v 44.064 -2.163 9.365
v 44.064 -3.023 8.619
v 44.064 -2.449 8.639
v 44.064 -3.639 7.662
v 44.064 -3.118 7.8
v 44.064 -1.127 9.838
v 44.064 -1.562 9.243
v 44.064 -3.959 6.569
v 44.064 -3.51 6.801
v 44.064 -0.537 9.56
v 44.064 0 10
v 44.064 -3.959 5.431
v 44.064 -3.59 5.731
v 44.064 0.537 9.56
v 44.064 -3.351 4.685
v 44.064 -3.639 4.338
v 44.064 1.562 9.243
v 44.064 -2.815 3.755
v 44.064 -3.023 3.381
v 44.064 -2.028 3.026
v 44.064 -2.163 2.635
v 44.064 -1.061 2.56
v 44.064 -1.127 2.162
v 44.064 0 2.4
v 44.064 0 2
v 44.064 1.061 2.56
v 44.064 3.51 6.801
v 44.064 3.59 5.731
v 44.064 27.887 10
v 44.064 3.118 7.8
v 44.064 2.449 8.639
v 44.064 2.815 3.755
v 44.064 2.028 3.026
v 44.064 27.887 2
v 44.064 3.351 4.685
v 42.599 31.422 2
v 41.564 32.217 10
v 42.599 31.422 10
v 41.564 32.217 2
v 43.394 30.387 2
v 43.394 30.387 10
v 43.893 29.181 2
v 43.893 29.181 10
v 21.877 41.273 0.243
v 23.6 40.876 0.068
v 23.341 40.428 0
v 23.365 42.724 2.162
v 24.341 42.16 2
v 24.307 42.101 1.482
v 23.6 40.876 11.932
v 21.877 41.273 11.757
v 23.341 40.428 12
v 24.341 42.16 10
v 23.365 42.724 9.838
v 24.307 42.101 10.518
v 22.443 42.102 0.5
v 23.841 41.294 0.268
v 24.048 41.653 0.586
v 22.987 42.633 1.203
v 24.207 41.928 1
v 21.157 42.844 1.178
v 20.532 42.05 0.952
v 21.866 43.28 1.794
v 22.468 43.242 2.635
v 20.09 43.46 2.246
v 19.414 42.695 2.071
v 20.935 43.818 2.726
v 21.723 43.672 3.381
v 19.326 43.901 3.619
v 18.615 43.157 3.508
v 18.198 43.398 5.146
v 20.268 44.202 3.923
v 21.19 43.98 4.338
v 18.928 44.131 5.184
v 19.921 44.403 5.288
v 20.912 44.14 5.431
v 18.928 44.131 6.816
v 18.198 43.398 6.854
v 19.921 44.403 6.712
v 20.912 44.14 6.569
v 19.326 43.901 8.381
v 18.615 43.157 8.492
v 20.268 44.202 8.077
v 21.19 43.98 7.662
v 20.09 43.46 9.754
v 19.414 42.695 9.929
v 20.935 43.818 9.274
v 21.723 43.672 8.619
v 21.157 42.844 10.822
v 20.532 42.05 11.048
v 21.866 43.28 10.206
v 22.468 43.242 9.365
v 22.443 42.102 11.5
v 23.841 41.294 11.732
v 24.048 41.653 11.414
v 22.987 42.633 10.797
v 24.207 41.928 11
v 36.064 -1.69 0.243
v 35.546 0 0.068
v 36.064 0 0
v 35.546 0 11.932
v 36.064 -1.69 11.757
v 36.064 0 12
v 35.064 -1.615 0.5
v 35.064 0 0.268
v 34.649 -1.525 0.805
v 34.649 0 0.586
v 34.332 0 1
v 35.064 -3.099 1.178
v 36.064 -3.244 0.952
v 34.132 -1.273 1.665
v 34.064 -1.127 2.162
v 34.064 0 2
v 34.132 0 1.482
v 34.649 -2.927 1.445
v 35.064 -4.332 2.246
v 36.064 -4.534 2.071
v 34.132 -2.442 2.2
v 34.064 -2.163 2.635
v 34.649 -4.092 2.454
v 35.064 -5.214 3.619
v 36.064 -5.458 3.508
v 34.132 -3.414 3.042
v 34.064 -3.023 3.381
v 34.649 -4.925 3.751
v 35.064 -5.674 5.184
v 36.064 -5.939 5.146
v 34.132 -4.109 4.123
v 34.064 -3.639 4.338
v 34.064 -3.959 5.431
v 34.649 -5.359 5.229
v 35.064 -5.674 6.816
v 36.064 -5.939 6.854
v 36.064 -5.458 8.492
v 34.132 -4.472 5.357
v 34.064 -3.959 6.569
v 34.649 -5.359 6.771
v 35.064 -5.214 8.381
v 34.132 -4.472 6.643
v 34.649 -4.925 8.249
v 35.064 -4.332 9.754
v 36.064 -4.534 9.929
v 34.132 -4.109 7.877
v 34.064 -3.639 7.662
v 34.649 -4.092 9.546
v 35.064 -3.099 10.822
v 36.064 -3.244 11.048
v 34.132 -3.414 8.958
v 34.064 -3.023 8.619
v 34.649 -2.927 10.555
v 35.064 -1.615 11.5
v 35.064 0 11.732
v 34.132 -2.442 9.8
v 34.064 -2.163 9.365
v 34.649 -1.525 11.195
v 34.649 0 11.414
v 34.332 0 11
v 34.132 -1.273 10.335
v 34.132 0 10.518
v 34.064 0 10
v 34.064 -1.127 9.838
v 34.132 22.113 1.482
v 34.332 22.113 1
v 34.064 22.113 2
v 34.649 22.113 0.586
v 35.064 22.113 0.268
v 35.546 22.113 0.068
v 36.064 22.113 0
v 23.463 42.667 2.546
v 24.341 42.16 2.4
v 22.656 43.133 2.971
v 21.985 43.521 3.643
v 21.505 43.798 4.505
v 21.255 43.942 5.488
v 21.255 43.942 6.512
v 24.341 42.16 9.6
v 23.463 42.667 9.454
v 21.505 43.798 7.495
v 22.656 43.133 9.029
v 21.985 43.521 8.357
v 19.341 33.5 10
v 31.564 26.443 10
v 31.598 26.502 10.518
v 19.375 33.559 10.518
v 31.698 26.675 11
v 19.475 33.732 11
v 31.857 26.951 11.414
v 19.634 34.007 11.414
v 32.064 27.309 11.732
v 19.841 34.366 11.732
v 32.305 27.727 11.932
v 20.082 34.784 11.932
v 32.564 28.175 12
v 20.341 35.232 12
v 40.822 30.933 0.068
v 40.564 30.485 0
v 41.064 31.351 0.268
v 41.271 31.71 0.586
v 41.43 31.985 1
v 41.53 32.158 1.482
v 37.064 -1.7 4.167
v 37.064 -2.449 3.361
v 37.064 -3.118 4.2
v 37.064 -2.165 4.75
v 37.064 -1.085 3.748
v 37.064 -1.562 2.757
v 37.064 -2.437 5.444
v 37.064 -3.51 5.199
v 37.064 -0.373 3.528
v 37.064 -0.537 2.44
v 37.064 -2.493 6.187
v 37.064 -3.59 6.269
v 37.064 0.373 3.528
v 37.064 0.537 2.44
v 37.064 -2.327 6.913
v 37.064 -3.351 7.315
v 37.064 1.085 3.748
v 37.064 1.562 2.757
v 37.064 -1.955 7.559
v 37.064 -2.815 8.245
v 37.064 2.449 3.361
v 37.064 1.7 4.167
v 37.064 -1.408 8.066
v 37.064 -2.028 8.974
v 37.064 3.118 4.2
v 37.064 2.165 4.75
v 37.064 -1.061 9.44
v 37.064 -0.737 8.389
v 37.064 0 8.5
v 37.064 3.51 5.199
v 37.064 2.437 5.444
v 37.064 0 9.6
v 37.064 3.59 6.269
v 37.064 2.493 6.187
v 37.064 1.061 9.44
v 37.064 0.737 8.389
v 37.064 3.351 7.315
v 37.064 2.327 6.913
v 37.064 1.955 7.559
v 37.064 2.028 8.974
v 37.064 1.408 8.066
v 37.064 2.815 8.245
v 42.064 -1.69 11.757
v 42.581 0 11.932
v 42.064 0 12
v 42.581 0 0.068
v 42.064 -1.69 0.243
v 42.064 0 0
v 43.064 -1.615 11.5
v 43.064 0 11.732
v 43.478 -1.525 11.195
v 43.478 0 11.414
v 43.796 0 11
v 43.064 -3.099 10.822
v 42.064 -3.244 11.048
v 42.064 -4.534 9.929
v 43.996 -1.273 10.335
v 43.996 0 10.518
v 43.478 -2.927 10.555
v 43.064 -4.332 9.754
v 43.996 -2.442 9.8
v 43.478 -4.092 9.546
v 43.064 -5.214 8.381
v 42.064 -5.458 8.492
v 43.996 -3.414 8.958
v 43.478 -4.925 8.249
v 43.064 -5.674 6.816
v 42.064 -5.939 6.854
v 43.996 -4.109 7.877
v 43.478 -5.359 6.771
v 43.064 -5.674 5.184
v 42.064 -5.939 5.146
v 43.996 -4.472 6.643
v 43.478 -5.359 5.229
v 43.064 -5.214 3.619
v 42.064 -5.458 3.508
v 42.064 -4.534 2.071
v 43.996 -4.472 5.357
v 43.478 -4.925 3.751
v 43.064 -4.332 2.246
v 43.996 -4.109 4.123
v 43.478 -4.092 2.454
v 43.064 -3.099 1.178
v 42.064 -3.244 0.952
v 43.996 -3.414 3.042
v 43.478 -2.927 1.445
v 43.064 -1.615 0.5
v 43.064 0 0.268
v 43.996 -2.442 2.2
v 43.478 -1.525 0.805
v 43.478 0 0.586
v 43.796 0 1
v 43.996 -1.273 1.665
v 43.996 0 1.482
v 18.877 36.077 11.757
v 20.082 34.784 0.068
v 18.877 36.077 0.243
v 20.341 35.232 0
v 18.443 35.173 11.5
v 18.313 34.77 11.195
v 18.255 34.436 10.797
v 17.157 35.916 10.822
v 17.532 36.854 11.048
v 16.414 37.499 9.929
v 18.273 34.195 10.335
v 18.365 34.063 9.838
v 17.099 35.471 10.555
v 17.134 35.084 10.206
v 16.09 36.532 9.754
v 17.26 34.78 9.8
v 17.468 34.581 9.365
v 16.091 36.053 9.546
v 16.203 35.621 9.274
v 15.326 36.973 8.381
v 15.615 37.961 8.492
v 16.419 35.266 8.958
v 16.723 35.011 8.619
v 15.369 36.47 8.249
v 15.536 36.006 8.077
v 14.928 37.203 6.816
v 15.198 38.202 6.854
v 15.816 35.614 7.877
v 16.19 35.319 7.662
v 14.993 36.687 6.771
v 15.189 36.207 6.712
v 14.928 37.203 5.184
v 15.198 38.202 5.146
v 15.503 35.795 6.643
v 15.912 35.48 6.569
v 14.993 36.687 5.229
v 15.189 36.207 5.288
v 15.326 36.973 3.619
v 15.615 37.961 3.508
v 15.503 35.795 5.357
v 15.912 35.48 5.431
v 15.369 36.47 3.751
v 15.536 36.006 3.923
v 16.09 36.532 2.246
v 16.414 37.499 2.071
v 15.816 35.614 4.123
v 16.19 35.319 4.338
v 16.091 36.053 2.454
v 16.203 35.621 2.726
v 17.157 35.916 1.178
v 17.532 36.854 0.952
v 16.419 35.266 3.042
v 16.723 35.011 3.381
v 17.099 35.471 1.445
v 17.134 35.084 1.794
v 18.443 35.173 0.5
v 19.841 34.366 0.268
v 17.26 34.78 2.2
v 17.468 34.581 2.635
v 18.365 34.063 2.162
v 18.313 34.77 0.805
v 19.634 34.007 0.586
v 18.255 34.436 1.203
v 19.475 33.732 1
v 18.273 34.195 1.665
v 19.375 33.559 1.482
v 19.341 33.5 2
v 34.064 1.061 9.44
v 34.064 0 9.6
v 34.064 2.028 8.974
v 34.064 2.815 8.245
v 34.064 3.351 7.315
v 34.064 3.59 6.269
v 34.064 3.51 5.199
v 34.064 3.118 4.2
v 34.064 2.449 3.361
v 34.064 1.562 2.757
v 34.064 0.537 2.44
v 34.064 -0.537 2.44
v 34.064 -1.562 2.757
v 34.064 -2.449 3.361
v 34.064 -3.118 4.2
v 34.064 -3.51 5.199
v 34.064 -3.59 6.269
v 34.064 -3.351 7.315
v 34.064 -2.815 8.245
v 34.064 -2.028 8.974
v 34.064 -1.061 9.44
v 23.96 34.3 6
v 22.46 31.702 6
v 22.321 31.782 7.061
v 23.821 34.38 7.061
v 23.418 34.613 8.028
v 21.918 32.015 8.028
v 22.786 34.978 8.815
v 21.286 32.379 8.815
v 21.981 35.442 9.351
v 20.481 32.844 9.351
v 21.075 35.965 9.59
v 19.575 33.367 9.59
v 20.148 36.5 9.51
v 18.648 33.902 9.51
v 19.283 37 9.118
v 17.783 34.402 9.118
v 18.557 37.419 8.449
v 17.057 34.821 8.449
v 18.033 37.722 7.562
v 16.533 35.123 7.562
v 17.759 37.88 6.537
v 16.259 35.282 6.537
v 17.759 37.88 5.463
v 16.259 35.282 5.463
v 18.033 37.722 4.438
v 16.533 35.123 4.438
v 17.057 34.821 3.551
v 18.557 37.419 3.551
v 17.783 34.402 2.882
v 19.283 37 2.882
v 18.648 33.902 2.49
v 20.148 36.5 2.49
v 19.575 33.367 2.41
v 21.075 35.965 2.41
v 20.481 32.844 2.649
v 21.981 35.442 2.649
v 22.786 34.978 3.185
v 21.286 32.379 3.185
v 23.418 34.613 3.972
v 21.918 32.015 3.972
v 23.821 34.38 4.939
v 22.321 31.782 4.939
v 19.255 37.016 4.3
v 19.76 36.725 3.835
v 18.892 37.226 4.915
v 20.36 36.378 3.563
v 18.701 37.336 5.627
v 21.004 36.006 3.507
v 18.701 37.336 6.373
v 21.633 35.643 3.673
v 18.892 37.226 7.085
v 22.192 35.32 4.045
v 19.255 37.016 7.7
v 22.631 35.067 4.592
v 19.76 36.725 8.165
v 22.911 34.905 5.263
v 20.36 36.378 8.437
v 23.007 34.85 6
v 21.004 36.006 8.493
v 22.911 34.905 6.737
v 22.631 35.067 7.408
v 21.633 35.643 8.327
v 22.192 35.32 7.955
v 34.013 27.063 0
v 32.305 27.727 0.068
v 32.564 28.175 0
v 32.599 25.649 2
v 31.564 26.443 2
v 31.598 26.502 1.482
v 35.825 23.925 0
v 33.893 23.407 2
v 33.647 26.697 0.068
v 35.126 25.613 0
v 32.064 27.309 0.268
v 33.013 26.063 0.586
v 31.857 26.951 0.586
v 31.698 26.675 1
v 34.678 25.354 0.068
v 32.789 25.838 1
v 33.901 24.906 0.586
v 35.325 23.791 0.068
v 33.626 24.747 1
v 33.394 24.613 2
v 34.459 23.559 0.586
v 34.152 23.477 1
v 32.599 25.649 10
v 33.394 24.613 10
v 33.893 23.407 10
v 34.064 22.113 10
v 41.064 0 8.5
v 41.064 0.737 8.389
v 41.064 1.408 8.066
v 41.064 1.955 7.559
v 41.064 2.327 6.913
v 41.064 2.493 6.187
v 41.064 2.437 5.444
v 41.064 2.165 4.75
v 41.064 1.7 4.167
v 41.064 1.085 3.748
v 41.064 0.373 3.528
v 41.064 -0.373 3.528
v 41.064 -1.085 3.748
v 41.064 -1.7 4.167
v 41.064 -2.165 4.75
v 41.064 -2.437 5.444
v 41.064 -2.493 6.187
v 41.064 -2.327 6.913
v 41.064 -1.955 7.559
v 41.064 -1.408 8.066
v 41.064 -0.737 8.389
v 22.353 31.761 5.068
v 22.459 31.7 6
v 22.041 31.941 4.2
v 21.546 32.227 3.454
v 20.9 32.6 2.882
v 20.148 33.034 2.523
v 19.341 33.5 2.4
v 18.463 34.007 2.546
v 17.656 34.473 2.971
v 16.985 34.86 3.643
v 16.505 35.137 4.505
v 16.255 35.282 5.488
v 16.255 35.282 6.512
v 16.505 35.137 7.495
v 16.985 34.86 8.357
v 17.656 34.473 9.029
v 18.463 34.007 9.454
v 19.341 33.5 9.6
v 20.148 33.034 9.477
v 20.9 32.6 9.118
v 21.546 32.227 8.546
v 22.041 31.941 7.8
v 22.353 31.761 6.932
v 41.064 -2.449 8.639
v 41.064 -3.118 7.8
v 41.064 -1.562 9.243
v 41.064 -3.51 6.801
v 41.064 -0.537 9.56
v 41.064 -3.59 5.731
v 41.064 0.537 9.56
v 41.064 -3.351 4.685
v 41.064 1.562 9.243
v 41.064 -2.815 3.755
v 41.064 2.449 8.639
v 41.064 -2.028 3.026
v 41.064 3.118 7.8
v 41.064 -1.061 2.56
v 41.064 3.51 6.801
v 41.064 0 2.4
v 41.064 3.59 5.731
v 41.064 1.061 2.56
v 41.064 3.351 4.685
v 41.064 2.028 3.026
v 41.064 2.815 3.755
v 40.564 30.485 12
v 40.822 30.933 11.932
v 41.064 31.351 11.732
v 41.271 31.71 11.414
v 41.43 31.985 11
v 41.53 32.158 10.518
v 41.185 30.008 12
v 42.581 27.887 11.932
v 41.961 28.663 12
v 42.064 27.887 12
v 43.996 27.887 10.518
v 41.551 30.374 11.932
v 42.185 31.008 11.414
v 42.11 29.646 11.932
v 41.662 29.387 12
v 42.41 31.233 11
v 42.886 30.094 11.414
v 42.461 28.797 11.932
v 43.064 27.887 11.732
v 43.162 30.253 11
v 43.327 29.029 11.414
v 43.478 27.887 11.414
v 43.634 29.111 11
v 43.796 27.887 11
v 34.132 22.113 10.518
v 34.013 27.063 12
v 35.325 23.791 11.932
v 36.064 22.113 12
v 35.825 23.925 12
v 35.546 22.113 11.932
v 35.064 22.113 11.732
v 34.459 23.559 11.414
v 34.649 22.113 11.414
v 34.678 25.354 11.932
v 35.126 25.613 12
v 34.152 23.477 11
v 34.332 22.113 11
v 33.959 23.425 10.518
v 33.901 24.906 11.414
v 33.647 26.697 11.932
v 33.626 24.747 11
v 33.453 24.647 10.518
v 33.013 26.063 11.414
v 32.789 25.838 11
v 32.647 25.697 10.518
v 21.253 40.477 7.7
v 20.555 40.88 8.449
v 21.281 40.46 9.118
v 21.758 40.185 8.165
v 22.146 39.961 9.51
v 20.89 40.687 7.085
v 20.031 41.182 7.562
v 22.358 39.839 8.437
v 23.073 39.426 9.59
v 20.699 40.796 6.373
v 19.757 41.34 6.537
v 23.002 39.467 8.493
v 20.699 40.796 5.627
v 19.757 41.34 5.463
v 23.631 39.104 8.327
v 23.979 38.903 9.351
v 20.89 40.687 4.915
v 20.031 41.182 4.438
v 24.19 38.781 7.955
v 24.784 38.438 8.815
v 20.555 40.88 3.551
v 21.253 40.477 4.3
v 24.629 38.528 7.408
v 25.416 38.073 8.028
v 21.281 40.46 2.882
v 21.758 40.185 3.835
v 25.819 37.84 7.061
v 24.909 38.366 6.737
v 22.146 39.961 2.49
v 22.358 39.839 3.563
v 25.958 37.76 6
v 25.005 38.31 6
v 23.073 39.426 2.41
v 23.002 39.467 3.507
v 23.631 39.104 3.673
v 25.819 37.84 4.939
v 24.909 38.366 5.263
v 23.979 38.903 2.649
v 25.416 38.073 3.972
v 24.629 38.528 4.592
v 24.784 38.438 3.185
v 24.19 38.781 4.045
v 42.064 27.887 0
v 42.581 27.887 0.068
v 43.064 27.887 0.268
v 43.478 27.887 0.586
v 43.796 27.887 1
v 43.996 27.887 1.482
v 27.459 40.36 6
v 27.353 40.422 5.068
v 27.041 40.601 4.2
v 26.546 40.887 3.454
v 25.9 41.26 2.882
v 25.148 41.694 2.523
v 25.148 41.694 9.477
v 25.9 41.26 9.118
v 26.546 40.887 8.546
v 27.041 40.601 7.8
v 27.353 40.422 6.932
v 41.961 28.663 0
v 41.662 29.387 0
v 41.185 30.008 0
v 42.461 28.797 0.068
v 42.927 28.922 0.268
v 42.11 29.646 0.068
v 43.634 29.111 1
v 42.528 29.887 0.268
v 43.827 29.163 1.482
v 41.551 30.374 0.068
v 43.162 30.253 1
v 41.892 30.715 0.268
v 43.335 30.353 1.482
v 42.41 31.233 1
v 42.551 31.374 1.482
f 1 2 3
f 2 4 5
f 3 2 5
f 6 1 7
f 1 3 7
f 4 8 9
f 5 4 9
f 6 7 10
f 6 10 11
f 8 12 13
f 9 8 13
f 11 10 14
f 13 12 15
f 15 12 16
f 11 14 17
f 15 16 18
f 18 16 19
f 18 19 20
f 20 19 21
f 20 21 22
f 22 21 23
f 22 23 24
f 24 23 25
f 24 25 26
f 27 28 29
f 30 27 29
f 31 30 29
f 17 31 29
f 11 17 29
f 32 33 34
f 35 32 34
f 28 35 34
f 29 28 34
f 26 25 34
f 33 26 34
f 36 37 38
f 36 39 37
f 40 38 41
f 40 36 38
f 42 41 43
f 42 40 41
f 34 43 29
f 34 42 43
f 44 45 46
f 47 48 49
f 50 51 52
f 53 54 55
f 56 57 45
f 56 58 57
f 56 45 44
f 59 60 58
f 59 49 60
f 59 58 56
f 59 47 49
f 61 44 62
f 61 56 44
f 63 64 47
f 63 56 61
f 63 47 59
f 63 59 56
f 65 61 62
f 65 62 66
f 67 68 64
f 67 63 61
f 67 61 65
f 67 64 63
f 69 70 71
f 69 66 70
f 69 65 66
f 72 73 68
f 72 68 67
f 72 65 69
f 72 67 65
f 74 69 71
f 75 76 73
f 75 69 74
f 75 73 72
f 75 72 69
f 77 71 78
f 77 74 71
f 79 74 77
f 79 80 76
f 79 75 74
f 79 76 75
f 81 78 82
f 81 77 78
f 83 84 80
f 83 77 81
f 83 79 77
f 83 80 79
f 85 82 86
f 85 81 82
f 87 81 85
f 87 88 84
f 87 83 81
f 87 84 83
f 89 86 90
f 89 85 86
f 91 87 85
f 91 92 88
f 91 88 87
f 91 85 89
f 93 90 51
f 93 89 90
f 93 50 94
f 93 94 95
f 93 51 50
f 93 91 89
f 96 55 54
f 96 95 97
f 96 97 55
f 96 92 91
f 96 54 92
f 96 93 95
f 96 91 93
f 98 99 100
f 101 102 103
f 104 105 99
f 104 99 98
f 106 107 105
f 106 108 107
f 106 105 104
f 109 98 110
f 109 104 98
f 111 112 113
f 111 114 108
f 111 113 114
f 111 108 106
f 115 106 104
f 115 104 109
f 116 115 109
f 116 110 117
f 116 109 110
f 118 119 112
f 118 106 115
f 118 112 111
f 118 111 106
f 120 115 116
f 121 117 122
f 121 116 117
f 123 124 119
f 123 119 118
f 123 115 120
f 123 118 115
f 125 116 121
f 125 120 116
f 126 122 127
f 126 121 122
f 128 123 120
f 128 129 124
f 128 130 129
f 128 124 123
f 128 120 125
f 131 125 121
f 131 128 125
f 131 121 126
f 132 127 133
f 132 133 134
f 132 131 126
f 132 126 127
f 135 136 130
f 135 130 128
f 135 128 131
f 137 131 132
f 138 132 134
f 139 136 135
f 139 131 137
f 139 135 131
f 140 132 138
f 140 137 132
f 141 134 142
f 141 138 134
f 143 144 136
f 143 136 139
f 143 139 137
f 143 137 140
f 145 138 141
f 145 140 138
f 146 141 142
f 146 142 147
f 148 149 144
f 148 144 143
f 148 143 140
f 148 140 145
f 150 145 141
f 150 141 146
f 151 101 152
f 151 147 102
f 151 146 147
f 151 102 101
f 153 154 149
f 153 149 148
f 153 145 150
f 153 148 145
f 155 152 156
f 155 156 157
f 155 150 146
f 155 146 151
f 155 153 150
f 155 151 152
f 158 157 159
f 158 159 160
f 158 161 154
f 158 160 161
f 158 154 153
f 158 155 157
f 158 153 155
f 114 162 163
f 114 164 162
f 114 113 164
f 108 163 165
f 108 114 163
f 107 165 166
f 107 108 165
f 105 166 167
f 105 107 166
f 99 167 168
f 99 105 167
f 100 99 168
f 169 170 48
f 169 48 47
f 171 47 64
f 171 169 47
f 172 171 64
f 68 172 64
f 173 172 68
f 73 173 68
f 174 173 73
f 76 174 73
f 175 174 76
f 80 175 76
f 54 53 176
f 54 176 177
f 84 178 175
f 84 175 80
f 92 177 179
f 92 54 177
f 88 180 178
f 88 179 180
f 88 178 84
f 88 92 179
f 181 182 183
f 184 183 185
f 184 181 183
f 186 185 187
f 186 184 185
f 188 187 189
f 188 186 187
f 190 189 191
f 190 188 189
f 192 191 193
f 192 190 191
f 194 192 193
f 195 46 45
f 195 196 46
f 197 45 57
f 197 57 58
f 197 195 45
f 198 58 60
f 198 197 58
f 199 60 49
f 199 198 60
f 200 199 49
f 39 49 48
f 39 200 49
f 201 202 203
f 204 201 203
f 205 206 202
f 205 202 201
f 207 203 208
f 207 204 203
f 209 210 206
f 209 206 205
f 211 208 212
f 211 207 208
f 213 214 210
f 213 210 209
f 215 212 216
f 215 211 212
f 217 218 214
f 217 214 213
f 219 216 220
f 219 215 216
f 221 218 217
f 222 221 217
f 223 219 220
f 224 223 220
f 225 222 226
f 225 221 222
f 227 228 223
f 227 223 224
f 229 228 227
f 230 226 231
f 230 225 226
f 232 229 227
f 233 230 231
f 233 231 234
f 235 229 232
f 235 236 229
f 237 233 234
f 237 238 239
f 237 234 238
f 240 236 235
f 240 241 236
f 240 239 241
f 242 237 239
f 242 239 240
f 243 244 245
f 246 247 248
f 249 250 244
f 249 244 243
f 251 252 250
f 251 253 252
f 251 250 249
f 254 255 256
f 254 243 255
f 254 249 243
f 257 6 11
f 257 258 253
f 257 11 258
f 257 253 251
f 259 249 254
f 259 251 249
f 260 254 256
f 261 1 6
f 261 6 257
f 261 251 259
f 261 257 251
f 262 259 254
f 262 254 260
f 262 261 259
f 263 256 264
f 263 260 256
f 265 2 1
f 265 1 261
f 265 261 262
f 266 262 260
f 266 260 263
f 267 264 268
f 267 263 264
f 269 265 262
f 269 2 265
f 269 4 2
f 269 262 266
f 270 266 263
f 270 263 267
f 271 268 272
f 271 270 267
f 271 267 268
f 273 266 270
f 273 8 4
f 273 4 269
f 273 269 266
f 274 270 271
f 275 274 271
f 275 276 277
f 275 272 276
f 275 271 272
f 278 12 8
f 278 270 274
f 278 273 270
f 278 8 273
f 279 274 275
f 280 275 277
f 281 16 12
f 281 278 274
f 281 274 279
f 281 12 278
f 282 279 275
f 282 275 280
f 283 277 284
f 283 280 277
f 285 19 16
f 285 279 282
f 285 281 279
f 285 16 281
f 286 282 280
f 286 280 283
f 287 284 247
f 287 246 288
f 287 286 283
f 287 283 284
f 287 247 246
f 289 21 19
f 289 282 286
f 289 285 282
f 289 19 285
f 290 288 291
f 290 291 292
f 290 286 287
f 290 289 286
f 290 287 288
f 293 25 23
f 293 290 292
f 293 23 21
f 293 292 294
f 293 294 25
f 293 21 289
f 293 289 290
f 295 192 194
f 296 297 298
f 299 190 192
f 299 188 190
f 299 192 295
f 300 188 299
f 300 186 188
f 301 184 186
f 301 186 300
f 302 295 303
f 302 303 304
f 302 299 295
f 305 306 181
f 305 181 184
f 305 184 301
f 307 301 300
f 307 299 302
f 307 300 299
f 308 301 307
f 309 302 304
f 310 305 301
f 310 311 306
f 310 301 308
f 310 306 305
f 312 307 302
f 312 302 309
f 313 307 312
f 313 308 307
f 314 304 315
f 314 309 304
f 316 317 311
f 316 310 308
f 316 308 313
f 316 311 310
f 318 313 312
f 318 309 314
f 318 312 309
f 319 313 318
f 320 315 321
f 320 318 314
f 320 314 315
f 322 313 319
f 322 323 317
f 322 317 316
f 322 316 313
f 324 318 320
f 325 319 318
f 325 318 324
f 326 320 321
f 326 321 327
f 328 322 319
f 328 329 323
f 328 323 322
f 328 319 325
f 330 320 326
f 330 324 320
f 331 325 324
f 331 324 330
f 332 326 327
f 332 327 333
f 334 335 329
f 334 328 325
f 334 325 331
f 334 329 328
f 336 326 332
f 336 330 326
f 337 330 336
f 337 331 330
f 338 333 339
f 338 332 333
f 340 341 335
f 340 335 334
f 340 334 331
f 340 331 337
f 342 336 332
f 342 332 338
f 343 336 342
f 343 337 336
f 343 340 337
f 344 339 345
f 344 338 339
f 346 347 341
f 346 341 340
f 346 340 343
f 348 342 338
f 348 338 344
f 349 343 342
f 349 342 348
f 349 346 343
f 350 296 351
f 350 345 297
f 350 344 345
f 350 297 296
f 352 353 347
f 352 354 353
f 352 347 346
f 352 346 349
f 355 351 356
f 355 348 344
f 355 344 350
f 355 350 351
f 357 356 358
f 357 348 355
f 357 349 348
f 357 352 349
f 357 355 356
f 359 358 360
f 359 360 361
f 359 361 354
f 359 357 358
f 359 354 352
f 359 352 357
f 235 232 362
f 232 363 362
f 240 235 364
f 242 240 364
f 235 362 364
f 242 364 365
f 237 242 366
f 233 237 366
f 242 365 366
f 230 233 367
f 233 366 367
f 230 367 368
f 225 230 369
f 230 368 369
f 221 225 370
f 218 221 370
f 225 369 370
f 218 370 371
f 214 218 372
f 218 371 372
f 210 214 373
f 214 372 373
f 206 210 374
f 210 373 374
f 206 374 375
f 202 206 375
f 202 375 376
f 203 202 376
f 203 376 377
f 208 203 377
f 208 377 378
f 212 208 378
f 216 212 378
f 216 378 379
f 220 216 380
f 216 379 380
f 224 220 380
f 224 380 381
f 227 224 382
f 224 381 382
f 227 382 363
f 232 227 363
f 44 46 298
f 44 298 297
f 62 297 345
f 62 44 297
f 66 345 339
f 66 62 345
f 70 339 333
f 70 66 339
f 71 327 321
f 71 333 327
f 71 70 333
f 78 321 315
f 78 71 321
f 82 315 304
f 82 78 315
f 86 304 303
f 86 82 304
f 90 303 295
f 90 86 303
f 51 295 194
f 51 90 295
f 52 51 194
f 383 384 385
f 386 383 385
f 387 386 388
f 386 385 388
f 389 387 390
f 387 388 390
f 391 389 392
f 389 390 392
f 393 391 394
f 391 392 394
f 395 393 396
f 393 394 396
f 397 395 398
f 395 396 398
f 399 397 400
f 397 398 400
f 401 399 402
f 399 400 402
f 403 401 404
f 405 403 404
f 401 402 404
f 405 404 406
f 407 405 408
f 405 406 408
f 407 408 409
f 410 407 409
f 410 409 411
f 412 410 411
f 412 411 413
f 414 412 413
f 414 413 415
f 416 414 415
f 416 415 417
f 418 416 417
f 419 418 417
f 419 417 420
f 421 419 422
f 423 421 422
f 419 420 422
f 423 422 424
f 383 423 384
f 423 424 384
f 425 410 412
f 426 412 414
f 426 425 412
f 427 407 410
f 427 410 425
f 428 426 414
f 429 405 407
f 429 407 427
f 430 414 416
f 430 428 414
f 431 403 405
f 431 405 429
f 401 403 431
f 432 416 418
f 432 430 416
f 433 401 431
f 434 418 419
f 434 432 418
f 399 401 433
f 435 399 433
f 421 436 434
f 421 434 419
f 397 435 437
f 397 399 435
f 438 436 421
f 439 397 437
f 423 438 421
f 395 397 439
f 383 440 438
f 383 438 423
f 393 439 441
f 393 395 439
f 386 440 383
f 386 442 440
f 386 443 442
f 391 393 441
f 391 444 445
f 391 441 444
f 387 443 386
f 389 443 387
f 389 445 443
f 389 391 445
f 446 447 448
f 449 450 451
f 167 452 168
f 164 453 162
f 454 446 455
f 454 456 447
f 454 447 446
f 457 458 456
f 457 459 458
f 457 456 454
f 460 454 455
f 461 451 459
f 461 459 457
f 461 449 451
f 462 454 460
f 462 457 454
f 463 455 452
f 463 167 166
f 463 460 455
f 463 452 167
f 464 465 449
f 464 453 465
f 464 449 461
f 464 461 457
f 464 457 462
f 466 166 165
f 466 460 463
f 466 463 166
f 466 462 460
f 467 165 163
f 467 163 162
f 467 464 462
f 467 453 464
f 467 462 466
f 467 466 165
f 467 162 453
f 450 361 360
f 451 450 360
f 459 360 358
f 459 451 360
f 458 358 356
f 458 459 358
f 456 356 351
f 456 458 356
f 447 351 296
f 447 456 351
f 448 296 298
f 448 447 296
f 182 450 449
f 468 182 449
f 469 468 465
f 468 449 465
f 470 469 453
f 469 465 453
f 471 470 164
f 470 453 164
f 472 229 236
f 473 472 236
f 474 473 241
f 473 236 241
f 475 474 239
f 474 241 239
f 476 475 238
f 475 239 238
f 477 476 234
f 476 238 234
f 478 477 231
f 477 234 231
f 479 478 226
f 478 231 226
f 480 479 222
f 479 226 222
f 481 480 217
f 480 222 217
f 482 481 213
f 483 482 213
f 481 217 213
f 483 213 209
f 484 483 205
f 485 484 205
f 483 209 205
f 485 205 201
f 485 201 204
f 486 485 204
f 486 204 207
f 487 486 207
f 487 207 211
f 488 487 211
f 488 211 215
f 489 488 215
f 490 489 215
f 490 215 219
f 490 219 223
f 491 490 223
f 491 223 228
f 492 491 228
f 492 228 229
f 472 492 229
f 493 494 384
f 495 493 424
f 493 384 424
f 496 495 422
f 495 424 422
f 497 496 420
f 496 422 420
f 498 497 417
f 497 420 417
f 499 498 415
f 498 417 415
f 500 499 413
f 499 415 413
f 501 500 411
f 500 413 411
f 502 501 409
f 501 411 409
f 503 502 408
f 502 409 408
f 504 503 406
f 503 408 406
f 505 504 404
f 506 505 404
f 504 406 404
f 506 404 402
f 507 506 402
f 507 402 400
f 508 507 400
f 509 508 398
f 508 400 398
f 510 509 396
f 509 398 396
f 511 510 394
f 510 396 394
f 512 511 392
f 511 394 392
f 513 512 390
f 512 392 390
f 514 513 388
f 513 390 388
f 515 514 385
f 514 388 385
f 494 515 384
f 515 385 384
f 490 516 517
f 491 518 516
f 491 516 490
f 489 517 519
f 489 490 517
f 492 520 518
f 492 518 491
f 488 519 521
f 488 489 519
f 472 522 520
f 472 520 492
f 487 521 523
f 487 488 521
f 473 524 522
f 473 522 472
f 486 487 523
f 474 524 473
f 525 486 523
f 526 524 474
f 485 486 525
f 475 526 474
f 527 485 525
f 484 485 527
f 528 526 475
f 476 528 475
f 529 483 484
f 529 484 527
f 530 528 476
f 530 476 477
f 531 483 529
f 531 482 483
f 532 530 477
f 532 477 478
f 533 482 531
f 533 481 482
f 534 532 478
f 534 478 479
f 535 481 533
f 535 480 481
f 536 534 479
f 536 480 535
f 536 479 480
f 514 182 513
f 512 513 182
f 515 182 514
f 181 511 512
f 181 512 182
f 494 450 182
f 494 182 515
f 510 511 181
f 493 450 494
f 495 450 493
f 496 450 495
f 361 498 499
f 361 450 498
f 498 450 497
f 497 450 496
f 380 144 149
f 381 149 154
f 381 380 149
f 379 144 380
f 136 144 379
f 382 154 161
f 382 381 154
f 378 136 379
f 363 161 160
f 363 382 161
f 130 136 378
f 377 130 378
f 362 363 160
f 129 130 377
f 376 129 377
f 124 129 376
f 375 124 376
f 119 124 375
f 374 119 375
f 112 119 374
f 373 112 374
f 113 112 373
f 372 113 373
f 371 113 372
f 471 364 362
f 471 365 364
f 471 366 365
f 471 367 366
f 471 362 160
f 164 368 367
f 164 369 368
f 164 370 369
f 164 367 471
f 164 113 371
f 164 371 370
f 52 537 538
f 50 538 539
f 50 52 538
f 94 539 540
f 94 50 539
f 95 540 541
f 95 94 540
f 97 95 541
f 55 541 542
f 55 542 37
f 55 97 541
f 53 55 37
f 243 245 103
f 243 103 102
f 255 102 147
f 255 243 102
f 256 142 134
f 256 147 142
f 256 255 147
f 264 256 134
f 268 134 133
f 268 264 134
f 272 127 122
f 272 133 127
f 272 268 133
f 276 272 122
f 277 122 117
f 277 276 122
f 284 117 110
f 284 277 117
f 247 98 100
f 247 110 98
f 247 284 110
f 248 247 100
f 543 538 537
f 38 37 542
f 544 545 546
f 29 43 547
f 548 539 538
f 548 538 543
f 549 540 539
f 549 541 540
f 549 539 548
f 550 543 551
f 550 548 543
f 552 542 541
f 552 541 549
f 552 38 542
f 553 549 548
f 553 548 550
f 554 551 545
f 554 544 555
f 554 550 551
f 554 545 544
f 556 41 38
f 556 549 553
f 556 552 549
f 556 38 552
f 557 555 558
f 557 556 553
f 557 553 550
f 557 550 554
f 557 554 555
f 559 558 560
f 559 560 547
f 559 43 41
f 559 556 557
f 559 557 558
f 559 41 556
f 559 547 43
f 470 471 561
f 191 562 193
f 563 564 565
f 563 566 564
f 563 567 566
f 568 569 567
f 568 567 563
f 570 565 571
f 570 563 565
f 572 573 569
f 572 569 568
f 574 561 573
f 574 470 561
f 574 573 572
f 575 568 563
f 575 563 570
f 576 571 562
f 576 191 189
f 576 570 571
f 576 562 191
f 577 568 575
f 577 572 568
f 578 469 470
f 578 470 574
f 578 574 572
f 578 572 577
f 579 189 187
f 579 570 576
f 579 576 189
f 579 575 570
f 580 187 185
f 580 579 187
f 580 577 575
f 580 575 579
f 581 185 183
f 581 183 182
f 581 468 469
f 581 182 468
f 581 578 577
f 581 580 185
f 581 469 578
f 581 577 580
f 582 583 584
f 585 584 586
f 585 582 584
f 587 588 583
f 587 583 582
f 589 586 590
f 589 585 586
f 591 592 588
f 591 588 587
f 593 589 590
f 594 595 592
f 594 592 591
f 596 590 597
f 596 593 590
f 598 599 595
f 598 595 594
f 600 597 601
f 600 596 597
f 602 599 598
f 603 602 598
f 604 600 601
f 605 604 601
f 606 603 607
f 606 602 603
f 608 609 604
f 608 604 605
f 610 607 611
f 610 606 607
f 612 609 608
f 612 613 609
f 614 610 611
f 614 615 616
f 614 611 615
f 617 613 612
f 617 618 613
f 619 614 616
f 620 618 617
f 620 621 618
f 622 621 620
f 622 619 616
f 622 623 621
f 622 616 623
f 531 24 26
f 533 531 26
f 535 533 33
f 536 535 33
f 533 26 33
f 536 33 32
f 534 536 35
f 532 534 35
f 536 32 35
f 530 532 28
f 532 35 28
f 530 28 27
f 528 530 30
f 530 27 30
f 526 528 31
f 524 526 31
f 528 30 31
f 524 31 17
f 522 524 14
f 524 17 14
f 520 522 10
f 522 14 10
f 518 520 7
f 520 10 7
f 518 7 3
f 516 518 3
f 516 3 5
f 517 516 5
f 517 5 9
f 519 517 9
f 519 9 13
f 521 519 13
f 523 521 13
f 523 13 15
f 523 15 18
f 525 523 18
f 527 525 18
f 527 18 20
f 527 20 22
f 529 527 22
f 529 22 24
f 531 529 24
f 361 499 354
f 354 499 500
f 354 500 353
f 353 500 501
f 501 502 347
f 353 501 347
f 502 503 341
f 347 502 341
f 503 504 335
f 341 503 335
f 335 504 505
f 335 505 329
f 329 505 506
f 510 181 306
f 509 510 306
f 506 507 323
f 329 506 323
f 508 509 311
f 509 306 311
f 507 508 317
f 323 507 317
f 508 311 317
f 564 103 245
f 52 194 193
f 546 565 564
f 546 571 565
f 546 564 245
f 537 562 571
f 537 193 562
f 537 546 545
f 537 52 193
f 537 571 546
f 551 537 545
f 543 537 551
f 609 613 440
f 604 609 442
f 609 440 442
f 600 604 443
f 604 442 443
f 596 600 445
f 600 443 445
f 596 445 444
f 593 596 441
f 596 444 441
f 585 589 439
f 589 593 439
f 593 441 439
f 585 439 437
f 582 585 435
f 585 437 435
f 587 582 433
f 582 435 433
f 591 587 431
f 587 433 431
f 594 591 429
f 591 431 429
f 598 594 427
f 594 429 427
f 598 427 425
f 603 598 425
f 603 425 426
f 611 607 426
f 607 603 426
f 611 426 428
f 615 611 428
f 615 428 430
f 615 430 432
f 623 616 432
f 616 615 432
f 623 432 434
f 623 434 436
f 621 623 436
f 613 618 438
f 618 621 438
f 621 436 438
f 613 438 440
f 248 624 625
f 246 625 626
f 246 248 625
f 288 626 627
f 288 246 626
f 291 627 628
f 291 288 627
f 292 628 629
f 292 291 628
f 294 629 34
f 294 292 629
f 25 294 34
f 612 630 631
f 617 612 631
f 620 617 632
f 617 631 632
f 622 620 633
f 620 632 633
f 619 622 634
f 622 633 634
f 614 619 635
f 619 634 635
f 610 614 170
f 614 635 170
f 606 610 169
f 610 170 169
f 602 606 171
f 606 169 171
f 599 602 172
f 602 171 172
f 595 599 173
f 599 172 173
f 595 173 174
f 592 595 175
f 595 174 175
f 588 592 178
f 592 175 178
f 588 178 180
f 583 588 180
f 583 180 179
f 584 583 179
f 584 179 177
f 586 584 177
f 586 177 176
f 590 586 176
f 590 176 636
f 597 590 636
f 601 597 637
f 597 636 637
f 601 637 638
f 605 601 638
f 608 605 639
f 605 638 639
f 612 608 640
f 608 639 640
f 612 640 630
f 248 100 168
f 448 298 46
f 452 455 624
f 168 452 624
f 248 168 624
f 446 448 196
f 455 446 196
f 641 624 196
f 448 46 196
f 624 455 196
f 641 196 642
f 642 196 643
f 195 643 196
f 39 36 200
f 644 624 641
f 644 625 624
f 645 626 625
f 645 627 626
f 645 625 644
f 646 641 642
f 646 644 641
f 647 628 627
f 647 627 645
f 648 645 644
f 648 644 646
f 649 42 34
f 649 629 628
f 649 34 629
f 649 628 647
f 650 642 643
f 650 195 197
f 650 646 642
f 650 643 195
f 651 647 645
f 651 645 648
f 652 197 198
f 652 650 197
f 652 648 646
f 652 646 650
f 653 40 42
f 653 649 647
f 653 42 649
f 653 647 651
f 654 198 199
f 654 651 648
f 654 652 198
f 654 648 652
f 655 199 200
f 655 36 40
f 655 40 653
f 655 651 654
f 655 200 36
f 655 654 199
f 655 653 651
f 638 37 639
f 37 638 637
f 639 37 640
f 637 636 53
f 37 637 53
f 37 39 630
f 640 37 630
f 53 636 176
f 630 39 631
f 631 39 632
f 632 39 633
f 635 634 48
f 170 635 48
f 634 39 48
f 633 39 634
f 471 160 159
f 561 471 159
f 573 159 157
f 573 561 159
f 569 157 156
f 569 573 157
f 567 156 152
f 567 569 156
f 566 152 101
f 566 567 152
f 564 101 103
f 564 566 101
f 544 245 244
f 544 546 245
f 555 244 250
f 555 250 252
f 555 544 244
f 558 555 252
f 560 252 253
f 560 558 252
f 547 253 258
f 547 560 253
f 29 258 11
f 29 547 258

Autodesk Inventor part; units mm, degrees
ref_plane "YZ Plane" through (0, 0, 0) normal (1, 0, 0) x (0, 1, 0)
sketch "Sketch1" plane through (0, 0, 0) normal (0, 0, 1) x (1, 0, 0)
  line L0 (44.063666, 0) -> (0, 0)
  line L1 (0, 0) -> (34.830781, 60.328682)
  line L2 (34.063666, 0) -> (34.063666, 22.113249)
  line L3 (31.563666, 26.443376) -> (19.341234, 33.5)
  line L4 (44.063666, 0) -> (44.063666, 27.886751)
  line L5 (41.563666, 32.216878) -> (24.341234, 42.160254)
  arc A0 (34.063666, 22.113249) -> (31.563666, 26.443376) centre (29.063666, 22.113249) ccw
  arc A1 (44.063666, 27.886751) -> (41.563666, 32.216878) centre (39.063666, 27.886751) ccw
  line L6 (24.341234, 42.160254) -> (19.341234, 33.5)
  line L7 (24.341234, 42.160254) -> (41.563666, 32.216878)
  line L8 (19.341234, 33.5) -> (31.563666, 26.443376)
  line L9 (34.063666, 0) -> (44.063666, 0)
  line L10 (44.063666, 0) -> (44.063666, 27.886751)
  line L11 (34.063666, 0) -> (44.063666, 0)
  line L12 (44.063666, 0) -> (44.063666, 27.886751)
  line L13 (41.563666, 32.216878) -> (24.341234, 42.160254)
  line L14 (24.341234, 42.160254) -> (19.341234, 33.5)
  line L15 (19.341234, 33.5) -> (31.563666, 26.443376)
  line L16 (34.063666, 22.113249) -> (34.063666, 0)
  point P0 (25, 43.30127)
  point P1 (34.063666, 25)
  dimension "d37" = 60
  dimension "d38" = 10
  dimension "d39" = 10
  dimension "d40" = 0
  dimension "d41" = 0
  dimension "d42" = 25
  dimension "d43" = 17
  dimension "d44" = 120
  dimension "d45" = 5
extrude "Extrusion1" add sketch "Sketch1" along normal blind 12 contours L0 L2 A0 L3 L1 L5 A1 L4
ref_plane "Work Plane1" through (41.563666, 32.216878, 0) normal (0.5, 0.8660254, 0) x (-0.8660254, 0.5, 0)
sketch "Sketch2" plane through (41.563666, 32.216878, 0) normal (0.5, 0.8660254, 0) x (-0.8660254, 0.5, 0)
  circle A0 centre (19.886751, 6) radius 6
  line L0 (19.886751, 0) -> (19.886751, 12)
  line L1 (0, 12) -> (19.886751, 12)
  dimension "d5" = 12
  dimension "d47" = 0
  dimension "d48" = 6
extrude "Extrusion2" add sketch "Sketch2" against normal blind 10
ref_plane "Work Plane2" through (44.063666, 27.886751, 0) normal (1, 0, 0) x (0, 1, 0)
sketch "Sketch3" plane through (44.063666, 27.886751, 0) normal (1, 0, 0) x (0, 1, 0)
  circle A0 centre (-27.886751, 6) radius 6
  line L0 (-27.886751, 0) -> (-27.886751, 12)
  line L1 (-27.886751, 0) -> (0, 0)
  point P0 (43.30127, 10)
  point P1 (5.613249, 12)
  dimension "d10" = 12
  dimension "d49" = 0
  dimension "d50" = 6
extrude "Extrusion3" add sketch "Sketch3" against normal blind 10
sketch "Sketch4" plane through (36.563666, 23.556624, 0) normal (-0.5, -0.8660254, 0) x (0.8660254, -0.5, 0)
  circle A0 centre (-19.886751, 6) radius 2.5
  circle A1 centre (-19.886751, 6) radius 6
  point P0 (-19.886751, 0)
  point P1 (-19.886751, 12)
  dimension "d15" = 5
extrude "Extrusion4" cut sketch "Sketch4" along normal through all both and the other way through all contours A0
sketch "Sketch5" plane through (34.063666, 27.886751, 0) normal (-1, 0, 0) x (0, 0, 1)
  circle A0 centre (6, -27.886751) radius 2.5
  arc A1 (0, -27.886751) -> (12, -27.886751) centre (6, -27.886751) ccw
  dimension "d18" = 5
extrude "Extrusion5" cut sketch "Sketch5" along normal through all both and the other way through all
sketch "Sketch6" plane through (41.563666, 32.216878, 0) normal (0.5, 0.8660254, 0) x (0.8660254, -0.5, 0)
  circle A0 centre (-19.886751, -6) radius 3.6
  circle A1 centre (-19.886751, -6) radius 2.5
  arc A2 (-19.886751, 0) -> (-19.886751, 0) centre (-19.886751, -6) ccw
  point P0 (0, -10)
  dimension "d21" = 5
  dimension "d22" = 7.2
extrude "Extrusion6" cut sketch "Sketch6" against normal blind 3 contours A0
sketch "Sketch7" plane through (36.563666, 23.556624, 0) normal (-0.5, -0.8660254, 0) x (0.8660254, -0.5, 0)
  circle A0 centre (-19.886751, 6) radius 3.6
  circle A1 centre (-19.886751, 6) radius 2.5
  arc A2 (-17.386751, 6) -> (-17.386751, 6) centre (-19.886751, 6) ccw
  point P0 (-19.886751, 0)
  dimension "d25" = 5
  dimension "d26" = 7.2
extrude "Extrusion7" cut sketch "Sketch7" along normal mid plane 6
sketch "Sketch8" plane through (34.063666, 27.886751, 0) normal (-1, 0, 0) x (0, 0, 1)
  circle A0 centre (6, -27.886751) radius 3.6
  circle A1 centre (6, -27.886751) radius 2.5
  arc A2 (8.5, -27.886751) -> (8.5, -27.886751) centre (6, -27.886751) ccw
  point P0 (0, -27.886751)
  dimension "d29" = 7.2
  dimension "d30" = 5
extrude "Extrusion8" cut sketch "Sketch8" along normal mid plane 6
sketch "Sketch9" plane through (44.063666, 27.886751, 0) normal (1, 0, 0) x (0, 0, -1)
  circle A0 centre (-6, -27.886751) radius 3.6
  circle A1 centre (-6, -27.886751) radius 2.5
  circle A2 centre (-6, -27.886751) radius 2.5
  point P0 (0, -27.886751)
  dimension "d33" = 5
  dimension "d34" = 7.2
extrude "Extrusion9" cut sketch "Sketch9" against normal blind 3
fillet "Fillet1" radius 2 16 edges at (19.1451, 45.1603, 6) (32.9524, 37.1886, 0) (43.3938, 30.3868, 0) (44.0637, 13.9434, 0) (44.0637, -6, 6) (44.0637, 13.9434, 12) (43.3938, 30.3868, 12) (32.9524, 37.1886, 12) (33.3938, 24.6132, 12) (34.0637, 11.0566, 12) (34.0637, -6, 6) (34.0637, 11.0566, 0) (33.3938, 24.6132, 0) (25.4524, 29.9717, 0) (14.1451, 36.5, 6) (25.4524, 29.9717, 12)
equation "\"d38\" = d46"
equation "\"d39\" = d46"
equation "\"d3\" = width"
equation "\"d5\" = width"
equation "\"d48\" = 0.5 * width"
equation "\"d8\" = thickness"
equation "\"d10\" = width"
equation "\"d50\" = 0.5 * width"
equation "\"d13\" = thickness"
equation "\"thickness\" = thickness_1"
equation "\"width\" = width_1"
equation "\"d46\" = 10"
equation "\"thickness_1\" = 10"
equation "\"width_1\" = 12"
properties part number "Link2"
